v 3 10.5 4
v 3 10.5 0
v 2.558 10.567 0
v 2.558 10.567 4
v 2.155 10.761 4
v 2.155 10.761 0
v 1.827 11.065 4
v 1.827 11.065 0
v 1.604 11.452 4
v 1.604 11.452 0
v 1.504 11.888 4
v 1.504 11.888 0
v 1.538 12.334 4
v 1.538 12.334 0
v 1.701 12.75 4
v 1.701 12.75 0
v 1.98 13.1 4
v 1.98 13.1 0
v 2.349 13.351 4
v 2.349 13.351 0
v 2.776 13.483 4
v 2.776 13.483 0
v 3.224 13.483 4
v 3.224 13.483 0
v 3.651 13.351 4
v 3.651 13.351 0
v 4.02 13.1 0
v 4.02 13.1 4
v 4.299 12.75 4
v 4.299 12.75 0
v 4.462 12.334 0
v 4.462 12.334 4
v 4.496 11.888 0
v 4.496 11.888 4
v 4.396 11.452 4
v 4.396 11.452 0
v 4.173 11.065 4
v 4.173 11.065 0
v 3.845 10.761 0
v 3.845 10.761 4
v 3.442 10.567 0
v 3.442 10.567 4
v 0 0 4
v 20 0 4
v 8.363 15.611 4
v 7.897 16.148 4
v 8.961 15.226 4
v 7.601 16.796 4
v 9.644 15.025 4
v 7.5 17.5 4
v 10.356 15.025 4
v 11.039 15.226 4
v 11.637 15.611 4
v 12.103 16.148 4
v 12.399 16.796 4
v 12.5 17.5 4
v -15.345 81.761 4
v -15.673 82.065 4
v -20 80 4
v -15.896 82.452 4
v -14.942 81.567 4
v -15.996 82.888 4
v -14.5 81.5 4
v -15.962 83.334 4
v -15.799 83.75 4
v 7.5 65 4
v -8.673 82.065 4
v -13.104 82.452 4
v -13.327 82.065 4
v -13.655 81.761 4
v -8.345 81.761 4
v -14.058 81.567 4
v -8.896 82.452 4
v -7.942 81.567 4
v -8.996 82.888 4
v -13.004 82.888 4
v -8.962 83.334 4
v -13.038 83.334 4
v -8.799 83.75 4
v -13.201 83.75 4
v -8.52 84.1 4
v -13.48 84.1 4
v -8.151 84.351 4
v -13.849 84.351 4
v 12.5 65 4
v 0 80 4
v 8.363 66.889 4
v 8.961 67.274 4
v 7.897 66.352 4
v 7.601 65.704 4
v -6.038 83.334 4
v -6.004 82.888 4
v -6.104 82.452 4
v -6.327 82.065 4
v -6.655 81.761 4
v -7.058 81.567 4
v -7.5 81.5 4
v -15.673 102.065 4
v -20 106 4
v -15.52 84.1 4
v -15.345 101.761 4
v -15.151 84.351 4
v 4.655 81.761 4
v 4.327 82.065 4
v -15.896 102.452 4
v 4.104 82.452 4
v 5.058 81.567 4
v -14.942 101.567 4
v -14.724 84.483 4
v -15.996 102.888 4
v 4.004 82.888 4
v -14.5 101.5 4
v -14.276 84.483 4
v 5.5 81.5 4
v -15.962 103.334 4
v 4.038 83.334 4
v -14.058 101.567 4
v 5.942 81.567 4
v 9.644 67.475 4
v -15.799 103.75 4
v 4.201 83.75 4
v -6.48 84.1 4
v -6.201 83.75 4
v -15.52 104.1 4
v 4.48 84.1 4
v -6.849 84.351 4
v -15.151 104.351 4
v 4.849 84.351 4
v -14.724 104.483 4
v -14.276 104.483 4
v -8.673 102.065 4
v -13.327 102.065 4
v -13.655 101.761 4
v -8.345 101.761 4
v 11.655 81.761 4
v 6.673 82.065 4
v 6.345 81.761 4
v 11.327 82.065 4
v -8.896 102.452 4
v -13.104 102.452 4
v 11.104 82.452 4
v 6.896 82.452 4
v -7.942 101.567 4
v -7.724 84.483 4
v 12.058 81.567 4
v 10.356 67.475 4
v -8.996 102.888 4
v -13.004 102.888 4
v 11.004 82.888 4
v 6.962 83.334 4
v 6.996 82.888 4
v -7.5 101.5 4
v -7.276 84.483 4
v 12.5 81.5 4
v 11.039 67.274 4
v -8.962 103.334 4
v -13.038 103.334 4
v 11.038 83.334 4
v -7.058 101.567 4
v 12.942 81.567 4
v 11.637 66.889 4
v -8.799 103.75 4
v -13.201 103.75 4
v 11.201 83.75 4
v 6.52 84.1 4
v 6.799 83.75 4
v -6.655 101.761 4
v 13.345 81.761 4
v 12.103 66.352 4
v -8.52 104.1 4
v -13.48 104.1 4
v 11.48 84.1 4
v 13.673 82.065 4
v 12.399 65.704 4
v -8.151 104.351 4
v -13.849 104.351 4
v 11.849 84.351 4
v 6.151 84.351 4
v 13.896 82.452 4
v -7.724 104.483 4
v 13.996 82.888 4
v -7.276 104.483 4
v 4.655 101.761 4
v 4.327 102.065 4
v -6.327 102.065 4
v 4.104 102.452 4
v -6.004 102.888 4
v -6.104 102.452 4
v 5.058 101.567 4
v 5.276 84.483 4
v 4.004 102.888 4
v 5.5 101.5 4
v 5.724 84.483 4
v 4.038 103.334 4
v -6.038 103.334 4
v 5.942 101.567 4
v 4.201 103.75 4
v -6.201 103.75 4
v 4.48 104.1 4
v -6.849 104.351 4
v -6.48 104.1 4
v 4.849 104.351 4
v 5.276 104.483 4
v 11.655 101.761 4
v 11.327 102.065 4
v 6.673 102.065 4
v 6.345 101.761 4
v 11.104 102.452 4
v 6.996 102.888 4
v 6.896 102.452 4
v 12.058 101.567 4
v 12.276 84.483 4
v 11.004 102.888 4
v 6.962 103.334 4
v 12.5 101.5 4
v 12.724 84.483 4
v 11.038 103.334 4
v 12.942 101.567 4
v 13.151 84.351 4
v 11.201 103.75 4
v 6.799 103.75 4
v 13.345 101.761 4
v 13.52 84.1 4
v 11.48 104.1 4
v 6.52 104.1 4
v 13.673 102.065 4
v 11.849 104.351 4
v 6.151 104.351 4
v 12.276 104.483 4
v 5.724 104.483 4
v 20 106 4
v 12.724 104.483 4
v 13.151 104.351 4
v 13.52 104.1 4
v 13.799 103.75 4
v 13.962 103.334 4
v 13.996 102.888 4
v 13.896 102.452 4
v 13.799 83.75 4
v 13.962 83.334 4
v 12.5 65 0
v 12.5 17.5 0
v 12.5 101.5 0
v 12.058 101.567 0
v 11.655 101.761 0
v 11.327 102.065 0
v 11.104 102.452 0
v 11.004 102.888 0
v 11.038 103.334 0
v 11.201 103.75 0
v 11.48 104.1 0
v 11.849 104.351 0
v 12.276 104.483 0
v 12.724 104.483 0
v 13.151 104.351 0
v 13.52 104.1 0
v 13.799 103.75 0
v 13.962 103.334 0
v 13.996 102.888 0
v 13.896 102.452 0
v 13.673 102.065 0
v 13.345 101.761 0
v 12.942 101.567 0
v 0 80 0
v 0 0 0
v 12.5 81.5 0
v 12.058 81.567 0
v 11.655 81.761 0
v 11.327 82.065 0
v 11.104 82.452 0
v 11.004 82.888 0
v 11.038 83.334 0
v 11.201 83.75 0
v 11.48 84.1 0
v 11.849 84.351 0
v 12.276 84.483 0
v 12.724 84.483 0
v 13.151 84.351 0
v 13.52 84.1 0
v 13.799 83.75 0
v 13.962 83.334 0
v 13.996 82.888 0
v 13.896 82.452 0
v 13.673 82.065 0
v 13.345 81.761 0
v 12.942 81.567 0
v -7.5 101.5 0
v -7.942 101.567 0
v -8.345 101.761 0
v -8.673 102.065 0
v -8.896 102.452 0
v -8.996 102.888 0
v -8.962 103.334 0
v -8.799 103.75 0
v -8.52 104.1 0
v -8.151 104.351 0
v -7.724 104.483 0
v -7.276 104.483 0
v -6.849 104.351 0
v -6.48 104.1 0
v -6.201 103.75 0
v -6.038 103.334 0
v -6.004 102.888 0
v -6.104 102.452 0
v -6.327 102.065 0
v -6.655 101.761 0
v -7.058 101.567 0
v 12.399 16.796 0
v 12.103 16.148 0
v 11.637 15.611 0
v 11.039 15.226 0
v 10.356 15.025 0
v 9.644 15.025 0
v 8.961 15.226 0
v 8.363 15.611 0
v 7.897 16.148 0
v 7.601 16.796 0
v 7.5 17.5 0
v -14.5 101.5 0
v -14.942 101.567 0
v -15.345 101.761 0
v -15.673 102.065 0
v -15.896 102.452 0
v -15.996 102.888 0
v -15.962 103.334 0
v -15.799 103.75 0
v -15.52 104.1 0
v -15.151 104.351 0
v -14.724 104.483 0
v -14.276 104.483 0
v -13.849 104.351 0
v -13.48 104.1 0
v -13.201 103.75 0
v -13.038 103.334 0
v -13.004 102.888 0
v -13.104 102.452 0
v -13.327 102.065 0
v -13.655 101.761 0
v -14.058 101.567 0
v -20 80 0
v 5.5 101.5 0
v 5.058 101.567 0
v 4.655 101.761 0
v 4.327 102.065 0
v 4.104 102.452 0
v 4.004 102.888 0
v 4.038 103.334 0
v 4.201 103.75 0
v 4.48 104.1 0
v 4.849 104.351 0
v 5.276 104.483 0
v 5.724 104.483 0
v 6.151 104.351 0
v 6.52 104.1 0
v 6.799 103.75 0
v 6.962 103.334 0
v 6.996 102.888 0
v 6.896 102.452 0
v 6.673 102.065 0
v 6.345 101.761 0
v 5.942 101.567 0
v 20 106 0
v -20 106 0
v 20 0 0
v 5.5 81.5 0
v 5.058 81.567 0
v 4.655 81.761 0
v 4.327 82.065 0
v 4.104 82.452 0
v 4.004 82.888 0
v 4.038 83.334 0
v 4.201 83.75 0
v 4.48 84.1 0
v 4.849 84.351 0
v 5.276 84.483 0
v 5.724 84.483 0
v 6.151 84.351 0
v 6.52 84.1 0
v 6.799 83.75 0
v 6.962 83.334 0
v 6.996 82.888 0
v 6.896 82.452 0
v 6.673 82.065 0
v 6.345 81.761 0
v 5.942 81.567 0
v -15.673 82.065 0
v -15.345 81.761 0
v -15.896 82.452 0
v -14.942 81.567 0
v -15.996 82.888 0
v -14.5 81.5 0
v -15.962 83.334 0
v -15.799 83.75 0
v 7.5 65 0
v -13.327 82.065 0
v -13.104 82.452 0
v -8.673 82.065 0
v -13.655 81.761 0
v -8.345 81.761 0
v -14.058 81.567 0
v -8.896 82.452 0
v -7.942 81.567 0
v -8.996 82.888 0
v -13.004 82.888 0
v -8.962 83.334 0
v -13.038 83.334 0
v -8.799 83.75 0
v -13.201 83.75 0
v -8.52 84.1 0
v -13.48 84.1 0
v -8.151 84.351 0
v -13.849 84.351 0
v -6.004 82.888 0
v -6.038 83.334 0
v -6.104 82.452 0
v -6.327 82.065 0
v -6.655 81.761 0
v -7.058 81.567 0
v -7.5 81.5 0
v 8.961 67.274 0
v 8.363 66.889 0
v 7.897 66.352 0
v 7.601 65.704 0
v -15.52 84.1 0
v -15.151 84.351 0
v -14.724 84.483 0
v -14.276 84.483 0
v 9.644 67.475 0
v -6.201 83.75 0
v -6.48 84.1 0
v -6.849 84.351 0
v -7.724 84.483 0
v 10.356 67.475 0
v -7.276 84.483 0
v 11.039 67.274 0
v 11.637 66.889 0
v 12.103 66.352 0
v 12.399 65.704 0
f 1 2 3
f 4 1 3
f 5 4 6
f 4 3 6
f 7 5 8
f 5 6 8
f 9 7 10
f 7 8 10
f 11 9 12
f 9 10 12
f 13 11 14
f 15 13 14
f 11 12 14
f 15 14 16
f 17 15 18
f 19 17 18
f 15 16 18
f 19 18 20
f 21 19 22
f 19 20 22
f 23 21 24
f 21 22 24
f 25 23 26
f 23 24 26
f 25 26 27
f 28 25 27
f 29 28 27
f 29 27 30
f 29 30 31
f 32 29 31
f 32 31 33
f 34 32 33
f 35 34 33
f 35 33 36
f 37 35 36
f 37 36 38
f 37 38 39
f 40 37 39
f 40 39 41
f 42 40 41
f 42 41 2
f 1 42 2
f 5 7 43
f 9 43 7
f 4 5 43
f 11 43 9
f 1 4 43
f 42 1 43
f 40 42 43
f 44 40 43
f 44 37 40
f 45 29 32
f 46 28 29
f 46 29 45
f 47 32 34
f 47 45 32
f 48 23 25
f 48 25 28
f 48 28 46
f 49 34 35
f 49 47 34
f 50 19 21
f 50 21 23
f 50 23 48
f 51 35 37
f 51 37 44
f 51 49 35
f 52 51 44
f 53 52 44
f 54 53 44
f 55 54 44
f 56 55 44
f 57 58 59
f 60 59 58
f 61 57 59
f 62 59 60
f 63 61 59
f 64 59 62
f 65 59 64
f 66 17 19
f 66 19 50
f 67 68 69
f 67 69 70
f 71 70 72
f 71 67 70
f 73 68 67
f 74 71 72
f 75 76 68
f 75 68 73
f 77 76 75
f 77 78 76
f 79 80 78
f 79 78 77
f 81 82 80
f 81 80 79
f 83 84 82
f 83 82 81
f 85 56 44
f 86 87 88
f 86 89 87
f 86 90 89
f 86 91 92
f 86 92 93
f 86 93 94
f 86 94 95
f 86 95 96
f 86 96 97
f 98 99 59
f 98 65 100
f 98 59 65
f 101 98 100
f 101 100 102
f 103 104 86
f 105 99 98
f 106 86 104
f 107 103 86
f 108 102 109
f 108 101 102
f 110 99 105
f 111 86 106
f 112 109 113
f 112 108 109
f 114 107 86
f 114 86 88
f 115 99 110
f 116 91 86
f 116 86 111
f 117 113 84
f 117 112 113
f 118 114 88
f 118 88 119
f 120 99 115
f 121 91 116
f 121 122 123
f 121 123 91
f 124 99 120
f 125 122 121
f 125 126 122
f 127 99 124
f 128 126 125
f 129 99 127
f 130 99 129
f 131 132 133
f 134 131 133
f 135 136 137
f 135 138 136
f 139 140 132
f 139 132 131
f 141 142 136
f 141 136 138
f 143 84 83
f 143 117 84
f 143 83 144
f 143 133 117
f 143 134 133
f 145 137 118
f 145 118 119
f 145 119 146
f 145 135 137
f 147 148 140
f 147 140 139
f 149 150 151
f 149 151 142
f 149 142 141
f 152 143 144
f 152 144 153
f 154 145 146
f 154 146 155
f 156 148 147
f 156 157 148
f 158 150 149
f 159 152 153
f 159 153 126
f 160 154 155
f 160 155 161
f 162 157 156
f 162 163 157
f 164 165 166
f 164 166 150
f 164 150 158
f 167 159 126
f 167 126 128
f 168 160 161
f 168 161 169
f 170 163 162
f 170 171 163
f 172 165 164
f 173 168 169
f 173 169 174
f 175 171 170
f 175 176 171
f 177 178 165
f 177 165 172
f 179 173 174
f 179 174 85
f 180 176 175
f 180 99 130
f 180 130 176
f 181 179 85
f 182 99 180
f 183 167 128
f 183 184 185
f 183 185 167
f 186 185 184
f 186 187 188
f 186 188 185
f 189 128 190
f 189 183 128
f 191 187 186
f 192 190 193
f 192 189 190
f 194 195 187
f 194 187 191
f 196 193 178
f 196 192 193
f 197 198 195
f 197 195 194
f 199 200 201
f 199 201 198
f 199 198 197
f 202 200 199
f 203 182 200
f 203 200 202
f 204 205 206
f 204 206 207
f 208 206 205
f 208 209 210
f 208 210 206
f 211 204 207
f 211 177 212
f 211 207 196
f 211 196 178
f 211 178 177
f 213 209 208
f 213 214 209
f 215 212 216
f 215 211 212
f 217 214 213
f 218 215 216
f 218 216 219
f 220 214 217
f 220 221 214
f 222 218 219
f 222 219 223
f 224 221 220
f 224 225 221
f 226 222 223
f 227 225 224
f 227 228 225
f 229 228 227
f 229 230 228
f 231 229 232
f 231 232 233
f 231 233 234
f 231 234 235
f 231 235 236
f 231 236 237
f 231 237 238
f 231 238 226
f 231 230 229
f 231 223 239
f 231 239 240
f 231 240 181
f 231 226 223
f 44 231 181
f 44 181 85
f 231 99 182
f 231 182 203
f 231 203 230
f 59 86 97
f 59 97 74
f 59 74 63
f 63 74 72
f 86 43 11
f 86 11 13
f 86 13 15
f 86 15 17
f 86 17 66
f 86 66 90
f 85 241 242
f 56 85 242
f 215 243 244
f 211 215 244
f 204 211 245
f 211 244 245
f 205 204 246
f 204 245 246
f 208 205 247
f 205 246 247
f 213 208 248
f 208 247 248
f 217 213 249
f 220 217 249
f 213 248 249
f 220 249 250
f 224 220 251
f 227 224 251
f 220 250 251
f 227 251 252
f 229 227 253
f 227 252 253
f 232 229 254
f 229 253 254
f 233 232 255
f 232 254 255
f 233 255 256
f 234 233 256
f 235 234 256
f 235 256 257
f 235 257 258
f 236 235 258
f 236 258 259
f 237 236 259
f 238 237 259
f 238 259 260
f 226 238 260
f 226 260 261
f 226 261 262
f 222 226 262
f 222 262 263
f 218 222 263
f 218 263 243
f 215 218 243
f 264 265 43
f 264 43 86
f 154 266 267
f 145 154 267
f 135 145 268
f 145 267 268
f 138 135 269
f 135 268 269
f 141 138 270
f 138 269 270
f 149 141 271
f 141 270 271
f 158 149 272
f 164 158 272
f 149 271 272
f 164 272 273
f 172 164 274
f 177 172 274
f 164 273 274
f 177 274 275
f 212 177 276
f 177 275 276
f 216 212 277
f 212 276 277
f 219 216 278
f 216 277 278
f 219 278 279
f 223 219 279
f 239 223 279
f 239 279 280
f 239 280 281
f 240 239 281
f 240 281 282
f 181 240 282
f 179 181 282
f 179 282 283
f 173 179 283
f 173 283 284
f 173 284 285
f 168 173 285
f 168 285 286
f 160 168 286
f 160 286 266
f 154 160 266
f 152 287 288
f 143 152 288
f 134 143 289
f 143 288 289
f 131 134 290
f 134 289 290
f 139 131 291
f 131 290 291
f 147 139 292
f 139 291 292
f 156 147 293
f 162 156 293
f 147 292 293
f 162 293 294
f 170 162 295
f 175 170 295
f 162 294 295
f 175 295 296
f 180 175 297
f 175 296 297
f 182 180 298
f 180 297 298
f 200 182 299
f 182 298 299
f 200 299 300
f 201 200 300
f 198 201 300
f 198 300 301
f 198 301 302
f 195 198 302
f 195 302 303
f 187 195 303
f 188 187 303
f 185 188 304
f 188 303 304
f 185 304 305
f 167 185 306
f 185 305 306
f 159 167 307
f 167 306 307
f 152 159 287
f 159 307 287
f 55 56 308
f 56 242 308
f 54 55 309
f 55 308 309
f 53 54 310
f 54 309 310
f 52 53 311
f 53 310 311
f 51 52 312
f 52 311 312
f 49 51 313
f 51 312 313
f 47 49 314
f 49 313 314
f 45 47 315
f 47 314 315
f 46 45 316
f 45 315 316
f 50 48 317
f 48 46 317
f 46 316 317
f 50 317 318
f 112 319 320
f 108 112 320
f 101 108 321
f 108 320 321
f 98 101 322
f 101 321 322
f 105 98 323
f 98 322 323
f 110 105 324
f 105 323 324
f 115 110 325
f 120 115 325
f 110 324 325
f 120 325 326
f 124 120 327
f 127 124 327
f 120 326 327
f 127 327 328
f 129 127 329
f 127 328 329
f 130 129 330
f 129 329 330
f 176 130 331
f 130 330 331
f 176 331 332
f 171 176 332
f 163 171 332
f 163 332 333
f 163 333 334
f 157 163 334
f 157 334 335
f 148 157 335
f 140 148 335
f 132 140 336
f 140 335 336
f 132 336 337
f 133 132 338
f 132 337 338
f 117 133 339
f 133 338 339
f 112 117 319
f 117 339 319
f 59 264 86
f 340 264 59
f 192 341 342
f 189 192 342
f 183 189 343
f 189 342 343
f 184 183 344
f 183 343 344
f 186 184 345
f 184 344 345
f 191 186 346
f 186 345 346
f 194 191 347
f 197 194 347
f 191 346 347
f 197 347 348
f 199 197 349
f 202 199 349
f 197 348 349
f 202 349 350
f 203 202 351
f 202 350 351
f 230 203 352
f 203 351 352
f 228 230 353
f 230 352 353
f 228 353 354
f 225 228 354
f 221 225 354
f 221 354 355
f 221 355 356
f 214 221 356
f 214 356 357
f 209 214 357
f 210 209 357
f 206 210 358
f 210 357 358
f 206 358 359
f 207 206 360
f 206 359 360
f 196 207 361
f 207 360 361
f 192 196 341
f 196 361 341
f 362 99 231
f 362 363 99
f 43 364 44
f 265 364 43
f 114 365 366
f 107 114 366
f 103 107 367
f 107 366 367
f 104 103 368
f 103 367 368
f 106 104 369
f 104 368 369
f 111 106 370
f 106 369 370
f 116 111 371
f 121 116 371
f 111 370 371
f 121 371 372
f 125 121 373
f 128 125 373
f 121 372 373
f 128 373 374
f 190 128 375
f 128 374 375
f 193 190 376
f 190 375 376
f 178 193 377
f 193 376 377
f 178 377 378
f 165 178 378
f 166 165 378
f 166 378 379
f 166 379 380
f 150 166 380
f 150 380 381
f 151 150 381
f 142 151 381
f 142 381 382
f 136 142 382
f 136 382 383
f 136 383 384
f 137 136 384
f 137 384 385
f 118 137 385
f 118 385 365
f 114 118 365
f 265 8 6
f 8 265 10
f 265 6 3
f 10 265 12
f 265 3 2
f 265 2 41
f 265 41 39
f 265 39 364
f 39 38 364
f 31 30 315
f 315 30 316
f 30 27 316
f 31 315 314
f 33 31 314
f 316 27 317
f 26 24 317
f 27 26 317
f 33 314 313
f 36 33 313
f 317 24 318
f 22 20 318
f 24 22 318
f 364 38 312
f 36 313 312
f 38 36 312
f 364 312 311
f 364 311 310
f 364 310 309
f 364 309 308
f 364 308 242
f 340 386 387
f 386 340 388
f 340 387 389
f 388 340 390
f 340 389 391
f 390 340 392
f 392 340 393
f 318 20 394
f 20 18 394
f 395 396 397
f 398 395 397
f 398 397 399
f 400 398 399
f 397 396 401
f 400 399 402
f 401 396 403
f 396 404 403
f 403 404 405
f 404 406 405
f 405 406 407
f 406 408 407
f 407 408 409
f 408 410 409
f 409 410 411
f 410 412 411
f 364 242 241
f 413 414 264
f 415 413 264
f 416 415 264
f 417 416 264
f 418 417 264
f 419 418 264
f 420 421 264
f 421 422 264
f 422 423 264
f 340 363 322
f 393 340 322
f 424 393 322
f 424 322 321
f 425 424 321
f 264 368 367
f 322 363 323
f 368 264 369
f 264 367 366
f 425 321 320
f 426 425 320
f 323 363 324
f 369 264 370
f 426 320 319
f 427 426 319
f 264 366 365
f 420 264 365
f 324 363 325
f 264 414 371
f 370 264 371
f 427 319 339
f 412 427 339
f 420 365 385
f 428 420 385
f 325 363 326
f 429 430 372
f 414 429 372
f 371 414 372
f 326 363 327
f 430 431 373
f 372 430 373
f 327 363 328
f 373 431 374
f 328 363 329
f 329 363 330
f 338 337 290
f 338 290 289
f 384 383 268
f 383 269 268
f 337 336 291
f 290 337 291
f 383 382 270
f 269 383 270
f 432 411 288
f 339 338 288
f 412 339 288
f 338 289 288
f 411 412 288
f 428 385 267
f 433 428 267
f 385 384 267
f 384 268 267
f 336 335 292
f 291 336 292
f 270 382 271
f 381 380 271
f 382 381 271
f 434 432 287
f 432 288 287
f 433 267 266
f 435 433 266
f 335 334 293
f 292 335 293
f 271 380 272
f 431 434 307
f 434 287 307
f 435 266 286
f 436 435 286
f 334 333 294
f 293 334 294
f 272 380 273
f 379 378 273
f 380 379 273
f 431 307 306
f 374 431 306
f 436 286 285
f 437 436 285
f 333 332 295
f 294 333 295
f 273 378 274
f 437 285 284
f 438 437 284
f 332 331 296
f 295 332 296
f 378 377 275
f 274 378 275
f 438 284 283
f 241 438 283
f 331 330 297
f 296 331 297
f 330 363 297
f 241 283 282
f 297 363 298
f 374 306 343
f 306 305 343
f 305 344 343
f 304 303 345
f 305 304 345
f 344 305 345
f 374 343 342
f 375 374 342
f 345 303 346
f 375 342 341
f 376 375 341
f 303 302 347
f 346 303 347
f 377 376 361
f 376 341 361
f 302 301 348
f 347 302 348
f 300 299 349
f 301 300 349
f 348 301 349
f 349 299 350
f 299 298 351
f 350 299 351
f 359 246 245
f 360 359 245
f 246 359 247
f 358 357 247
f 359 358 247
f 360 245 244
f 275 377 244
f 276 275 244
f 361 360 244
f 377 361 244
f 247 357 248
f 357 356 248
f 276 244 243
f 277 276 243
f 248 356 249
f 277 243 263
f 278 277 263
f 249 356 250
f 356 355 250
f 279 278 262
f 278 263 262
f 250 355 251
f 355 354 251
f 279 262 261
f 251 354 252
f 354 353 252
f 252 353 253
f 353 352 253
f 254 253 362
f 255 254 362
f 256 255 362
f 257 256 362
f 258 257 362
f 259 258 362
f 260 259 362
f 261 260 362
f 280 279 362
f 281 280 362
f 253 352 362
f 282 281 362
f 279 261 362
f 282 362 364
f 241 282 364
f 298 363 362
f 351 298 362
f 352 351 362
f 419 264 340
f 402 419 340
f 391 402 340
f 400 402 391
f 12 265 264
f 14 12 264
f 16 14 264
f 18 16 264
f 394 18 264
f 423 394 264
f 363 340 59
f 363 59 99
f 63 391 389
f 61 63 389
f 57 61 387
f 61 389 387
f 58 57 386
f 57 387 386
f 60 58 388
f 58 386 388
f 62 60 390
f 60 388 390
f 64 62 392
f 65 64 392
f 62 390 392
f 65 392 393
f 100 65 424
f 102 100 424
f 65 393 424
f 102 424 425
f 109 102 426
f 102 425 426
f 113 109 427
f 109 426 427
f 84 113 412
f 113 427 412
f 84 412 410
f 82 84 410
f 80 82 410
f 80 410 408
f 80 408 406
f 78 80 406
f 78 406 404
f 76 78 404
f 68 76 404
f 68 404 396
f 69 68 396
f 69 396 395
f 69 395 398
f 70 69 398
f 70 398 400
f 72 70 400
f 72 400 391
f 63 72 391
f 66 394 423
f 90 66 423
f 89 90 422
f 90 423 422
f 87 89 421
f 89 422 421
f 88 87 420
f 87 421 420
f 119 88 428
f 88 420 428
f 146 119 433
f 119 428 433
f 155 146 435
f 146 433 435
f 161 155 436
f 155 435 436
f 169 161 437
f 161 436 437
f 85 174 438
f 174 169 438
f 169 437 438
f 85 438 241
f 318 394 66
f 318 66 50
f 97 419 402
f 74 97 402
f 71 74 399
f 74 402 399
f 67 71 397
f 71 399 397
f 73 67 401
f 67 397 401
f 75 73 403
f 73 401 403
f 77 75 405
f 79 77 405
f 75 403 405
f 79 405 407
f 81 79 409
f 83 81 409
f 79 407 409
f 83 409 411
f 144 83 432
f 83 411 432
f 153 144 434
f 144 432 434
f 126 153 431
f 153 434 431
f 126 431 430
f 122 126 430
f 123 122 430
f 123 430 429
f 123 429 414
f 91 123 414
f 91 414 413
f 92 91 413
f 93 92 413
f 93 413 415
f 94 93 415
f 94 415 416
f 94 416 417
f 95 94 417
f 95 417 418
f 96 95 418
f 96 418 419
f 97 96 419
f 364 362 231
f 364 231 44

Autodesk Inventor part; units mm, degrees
ref_plane "YZ Plane" through (0, 0, 0) normal (1, 0, 0) x (0, 1, 0)
ref_plane "XZ Plane" through (0, 0, 0) normal (0, 1, 0) x (-1, 0, 0)
ref_plane "XY Plane" through (0, 0, 0) normal (0, 0, 1) x (1, 0, 0)
sketch "Skizze1" plane through (0, 0, 0) normal (0, 0, 1) x (1, 0, 0)
  line L0 (0, 0) -> (0, 80)
  line L1 (0, 80) -> (-20, 80)
  line L2 (-20, 80) -> (-20, 106)
  line L3 (-20, 106) -> (20, 106)
  line L4 (20, 106) -> (20, 0)
  line L5 (20, 0) -> (0, 0)
  arc A0 (7.5, 17.5) -> (12.5, 17.5) centre (10, 17.5) ccw
  arc A1 (12.5, 65) -> (7.5, 65) centre (10, 65) ccw
  line L6 (7.5, 65) -> (7.5, 17.5)
  line L7 (12.5, 65) -> (12.5, 17.5)
  dimension "d0" = 26
  dimension "d1" = 80
  dimension "d2" = 40
  dimension "d3" = 20
  dimension "d5" = 5
  dimension "d6" = 15
  dimension "d7" = 10
  dimension "d8" = 10
  dimension "d9" = 65
  dimension "d12" = 2.5
extrude "Extrusion1" add sketch "Skizze1" along normal blind 4
hole "Bohrung1" at (-14.5, 83, 4) direction (0, 0, -1) diameter 3 depth 8 tip angle 118
hole "Bohrung2" at (-7.5, 83, 4) direction (0, 0, -1) diameter 3 depth 8 tip angle 118
hole "Bohrung3" at (5.5, 83, 4) direction (0, 0, -1) diameter 3 depth 8 tip angle 118
hole "Bohrung4" at (12.5, 83, 4) direction (0, 0, -1) diameter 3 depth 8 tip angle 118
hole "Bohrung5" at (-14.5, 103, 4) direction (0, 0, -1) diameter 3 depth 8 tip angle 118
hole "Bohrung6" at (-7.5, 103, 4) direction (0, 0, -1) diameter 3 depth 8 tip angle 118
hole "Bohrung7" at (5.5, 103, 4) direction (0, 0, -1) diameter 3 depth 8 tip angle 118
hole "Bohrung8" at (12.5, 103, 4) direction (0, 0, -1) diameter 3 depth 8 tip angle 118
hole "Bohrung9" at (3, 12, 4) direction (0, 0, -1) diameter 3 depth 8 tip angle 118
properties part number "Montageplatte"
